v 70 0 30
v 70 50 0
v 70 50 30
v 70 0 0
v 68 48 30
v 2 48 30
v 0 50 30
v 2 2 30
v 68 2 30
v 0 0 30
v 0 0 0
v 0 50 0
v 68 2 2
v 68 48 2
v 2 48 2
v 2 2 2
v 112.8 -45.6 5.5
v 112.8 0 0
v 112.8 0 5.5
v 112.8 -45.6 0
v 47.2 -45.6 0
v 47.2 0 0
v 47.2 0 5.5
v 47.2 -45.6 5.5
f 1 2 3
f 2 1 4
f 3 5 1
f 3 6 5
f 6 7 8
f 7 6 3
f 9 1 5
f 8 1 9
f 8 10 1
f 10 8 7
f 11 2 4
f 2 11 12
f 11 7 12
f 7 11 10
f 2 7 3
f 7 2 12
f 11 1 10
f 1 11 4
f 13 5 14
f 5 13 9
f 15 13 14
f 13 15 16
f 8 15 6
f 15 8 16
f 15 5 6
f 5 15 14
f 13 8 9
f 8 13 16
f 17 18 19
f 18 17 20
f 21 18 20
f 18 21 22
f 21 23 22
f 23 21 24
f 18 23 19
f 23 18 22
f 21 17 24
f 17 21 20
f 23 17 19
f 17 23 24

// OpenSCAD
// Two-part enclosure for small electronics board
// Print orientation: box on bed (z = 0), lid on +X side, both build upward

// ---------- Parameters ----------
box_x      = 70;    // box outer size in X
box_y      = 50;    // box outer size in Y
box_z      = 30;    // box outer size in Z
wall       = 2;     // box wall thickness
floor      = 2;     // box floor thickness

lip_x      = 65.6;  // lip outer size in X
lip_y      = 45.6;  // lip outer size in Y
lip_t      = 1.5;   // lip wall thickness
lip_h      = 4;     // lip height

gap        = 10;    // gap between box and lid
eps        = 0.5;   // cutter overshoot

$fn = 64;

// ---------- Derived ----------
box_xi = box_x - 2 * wall;   // box inner X
box_yi = box_y - 2 * wall;   // box inner Y
box_zi = box_z - floor;      // box cavity height (open top)

// ---------- Model ----------
union() {
    // Box
    difference() {
        cube([box_x, box_y, box_z]);
        translate([wall, wall, floor])
            cube([box_xi, box_yi, box_zi + 0.01]); // open-top cavity
    }

    // Lid (printed upside down: plate on bed, lip upward)
    translate([box_x + gap, -lip_y / 2, 0]) {
        union() {
            // Plate
            translate([-lip_x / 2, -lip_y / 2, 0])
                cube([lip_x, lip_y, 2]);

            // Lip
            translate([-lip_x / 2, -lip_y / 2, 0])
                cube([lip_x, lip_y, lip_t]);
            translate([-lip_x / 2, -lip_y / 2, lip_t])
                cube([lip_x, lip_y, lip_h]);
        }
    }
}
